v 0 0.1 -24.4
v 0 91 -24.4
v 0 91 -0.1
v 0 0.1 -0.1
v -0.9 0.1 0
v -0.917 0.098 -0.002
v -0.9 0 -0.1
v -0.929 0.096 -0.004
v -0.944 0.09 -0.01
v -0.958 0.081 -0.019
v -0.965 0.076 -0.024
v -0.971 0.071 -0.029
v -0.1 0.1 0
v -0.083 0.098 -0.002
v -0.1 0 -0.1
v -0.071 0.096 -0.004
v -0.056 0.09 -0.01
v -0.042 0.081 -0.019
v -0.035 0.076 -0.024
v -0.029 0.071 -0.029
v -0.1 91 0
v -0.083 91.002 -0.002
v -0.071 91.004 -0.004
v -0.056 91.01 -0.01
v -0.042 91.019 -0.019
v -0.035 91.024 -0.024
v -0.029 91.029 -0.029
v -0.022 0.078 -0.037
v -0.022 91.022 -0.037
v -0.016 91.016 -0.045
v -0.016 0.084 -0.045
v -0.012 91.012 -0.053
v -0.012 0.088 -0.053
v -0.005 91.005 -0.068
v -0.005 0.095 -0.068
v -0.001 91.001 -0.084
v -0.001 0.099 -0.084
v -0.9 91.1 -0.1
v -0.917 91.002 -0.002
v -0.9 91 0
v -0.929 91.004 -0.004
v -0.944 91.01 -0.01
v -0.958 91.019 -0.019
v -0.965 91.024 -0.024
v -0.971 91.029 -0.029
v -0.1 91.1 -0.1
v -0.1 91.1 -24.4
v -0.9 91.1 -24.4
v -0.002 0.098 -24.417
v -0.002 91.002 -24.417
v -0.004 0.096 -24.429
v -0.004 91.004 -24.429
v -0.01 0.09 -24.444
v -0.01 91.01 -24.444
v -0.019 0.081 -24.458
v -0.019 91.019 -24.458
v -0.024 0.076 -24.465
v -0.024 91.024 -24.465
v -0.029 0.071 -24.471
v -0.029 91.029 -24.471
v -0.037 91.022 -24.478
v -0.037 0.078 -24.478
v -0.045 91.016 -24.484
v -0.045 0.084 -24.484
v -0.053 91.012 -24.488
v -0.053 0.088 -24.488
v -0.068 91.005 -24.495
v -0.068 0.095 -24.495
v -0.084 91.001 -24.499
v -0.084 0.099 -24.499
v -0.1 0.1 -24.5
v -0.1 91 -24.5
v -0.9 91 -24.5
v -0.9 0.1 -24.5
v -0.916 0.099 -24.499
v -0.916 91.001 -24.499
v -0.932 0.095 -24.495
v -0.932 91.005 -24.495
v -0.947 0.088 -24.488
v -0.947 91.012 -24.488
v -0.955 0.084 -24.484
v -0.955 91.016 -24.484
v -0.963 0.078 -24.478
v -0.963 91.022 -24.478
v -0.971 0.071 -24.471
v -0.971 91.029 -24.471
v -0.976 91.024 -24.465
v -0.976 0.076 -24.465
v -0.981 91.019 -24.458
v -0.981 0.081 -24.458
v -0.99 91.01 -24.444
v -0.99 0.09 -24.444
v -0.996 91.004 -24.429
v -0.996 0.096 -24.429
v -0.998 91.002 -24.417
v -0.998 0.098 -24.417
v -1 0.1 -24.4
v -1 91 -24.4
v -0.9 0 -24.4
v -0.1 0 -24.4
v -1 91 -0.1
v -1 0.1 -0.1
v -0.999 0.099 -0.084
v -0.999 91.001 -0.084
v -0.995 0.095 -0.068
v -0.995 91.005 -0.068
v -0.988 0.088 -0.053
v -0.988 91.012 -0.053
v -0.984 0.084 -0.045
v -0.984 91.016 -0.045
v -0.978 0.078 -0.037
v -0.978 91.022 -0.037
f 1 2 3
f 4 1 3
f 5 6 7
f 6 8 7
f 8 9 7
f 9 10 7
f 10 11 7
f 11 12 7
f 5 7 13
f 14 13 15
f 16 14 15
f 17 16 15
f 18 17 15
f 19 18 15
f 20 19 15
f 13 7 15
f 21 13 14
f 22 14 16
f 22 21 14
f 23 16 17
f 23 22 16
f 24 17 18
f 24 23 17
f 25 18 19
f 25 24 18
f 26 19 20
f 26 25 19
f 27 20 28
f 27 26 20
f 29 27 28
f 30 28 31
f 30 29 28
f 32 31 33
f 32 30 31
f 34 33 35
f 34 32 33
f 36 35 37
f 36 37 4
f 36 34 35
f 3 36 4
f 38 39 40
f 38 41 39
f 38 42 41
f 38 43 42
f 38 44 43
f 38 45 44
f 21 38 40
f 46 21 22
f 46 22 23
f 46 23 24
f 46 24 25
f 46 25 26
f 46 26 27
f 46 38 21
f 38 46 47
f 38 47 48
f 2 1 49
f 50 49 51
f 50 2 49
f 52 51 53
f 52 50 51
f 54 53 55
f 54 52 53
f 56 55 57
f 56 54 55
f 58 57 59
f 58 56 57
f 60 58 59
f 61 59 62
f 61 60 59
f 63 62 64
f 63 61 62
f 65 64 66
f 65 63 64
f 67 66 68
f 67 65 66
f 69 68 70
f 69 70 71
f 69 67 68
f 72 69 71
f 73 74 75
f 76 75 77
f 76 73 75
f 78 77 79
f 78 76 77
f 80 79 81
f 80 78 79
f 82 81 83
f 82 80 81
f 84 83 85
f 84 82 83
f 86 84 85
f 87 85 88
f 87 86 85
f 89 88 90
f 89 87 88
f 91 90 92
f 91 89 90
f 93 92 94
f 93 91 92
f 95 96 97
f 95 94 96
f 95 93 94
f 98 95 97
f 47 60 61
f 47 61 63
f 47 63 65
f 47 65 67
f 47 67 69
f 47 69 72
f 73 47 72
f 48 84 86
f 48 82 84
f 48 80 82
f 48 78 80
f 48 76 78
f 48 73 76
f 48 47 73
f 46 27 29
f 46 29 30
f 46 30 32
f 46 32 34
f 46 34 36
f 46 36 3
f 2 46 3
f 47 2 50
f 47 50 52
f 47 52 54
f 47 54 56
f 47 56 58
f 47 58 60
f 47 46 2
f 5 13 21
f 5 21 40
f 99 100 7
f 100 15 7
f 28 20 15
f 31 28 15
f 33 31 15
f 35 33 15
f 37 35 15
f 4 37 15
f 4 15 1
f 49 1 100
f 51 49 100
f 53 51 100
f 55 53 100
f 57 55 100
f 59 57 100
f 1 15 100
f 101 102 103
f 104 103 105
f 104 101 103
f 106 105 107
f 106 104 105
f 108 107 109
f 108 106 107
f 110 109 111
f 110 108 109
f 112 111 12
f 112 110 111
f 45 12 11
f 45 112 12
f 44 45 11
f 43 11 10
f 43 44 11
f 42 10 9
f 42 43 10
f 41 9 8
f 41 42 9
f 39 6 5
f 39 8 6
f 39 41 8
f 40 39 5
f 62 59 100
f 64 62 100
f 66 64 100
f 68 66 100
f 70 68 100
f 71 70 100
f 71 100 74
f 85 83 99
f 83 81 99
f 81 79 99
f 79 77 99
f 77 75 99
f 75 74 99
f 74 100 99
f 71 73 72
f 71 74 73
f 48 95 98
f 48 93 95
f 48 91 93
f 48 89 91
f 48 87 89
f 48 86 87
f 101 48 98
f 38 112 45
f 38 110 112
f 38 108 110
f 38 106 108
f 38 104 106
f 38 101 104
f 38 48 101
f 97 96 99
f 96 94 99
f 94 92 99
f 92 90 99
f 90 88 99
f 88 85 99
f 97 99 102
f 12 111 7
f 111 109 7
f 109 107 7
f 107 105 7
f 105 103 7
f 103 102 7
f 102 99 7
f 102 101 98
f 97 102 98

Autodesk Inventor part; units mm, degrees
ref_plane "YZ Plane" through (0, 0, 0) normal (1, 0, 0) x (0, 1, 0)
ref_plane "XZ Plane" through (0, 0, 0) normal (0, 1, 0) x (-1, 0, 0)
ref_plane "XY Plane" through (0, 0, 0) normal (0, 0, 1) x (1, 0, 0)
sketch "Sketch1" plane through (0, 0, 0) normal (0, 1, 0) x (-1, 0, 0)
  line L0 (0, 0) -> (1, 0)
  line L1 (1, 0) -> (1, -24.5)
  line L2 (1, -24.5) -> (0, -24.5)
  line L3 (0, -24.5) -> (0, 0)
  dimension "d0" = 1
  dimension "d1" = 24.5
extrude "Extrusion1" add sketch "Sketch1" along normal blind 91.1
chamfer "Chamfer1" distance 0.1 angle 45 8 edges at (0, 91.1, -12.25) (-1, 91.1, -12.25) (0, 0, -12.25) (-1, 0, -12.25) (-0.5, 91.1, 0) (-0.5, 91.1, -24.5) (-0.5, 0, 0) (-0.5, 0, -24.5)
fillet "Fillet1" radius 0.1 4 edges at (-1, 45.55, 0) (0, 45.55, 0) (-1, 45.55, -24.5) (0, 45.55, -24.5)
properties part number "floor"
